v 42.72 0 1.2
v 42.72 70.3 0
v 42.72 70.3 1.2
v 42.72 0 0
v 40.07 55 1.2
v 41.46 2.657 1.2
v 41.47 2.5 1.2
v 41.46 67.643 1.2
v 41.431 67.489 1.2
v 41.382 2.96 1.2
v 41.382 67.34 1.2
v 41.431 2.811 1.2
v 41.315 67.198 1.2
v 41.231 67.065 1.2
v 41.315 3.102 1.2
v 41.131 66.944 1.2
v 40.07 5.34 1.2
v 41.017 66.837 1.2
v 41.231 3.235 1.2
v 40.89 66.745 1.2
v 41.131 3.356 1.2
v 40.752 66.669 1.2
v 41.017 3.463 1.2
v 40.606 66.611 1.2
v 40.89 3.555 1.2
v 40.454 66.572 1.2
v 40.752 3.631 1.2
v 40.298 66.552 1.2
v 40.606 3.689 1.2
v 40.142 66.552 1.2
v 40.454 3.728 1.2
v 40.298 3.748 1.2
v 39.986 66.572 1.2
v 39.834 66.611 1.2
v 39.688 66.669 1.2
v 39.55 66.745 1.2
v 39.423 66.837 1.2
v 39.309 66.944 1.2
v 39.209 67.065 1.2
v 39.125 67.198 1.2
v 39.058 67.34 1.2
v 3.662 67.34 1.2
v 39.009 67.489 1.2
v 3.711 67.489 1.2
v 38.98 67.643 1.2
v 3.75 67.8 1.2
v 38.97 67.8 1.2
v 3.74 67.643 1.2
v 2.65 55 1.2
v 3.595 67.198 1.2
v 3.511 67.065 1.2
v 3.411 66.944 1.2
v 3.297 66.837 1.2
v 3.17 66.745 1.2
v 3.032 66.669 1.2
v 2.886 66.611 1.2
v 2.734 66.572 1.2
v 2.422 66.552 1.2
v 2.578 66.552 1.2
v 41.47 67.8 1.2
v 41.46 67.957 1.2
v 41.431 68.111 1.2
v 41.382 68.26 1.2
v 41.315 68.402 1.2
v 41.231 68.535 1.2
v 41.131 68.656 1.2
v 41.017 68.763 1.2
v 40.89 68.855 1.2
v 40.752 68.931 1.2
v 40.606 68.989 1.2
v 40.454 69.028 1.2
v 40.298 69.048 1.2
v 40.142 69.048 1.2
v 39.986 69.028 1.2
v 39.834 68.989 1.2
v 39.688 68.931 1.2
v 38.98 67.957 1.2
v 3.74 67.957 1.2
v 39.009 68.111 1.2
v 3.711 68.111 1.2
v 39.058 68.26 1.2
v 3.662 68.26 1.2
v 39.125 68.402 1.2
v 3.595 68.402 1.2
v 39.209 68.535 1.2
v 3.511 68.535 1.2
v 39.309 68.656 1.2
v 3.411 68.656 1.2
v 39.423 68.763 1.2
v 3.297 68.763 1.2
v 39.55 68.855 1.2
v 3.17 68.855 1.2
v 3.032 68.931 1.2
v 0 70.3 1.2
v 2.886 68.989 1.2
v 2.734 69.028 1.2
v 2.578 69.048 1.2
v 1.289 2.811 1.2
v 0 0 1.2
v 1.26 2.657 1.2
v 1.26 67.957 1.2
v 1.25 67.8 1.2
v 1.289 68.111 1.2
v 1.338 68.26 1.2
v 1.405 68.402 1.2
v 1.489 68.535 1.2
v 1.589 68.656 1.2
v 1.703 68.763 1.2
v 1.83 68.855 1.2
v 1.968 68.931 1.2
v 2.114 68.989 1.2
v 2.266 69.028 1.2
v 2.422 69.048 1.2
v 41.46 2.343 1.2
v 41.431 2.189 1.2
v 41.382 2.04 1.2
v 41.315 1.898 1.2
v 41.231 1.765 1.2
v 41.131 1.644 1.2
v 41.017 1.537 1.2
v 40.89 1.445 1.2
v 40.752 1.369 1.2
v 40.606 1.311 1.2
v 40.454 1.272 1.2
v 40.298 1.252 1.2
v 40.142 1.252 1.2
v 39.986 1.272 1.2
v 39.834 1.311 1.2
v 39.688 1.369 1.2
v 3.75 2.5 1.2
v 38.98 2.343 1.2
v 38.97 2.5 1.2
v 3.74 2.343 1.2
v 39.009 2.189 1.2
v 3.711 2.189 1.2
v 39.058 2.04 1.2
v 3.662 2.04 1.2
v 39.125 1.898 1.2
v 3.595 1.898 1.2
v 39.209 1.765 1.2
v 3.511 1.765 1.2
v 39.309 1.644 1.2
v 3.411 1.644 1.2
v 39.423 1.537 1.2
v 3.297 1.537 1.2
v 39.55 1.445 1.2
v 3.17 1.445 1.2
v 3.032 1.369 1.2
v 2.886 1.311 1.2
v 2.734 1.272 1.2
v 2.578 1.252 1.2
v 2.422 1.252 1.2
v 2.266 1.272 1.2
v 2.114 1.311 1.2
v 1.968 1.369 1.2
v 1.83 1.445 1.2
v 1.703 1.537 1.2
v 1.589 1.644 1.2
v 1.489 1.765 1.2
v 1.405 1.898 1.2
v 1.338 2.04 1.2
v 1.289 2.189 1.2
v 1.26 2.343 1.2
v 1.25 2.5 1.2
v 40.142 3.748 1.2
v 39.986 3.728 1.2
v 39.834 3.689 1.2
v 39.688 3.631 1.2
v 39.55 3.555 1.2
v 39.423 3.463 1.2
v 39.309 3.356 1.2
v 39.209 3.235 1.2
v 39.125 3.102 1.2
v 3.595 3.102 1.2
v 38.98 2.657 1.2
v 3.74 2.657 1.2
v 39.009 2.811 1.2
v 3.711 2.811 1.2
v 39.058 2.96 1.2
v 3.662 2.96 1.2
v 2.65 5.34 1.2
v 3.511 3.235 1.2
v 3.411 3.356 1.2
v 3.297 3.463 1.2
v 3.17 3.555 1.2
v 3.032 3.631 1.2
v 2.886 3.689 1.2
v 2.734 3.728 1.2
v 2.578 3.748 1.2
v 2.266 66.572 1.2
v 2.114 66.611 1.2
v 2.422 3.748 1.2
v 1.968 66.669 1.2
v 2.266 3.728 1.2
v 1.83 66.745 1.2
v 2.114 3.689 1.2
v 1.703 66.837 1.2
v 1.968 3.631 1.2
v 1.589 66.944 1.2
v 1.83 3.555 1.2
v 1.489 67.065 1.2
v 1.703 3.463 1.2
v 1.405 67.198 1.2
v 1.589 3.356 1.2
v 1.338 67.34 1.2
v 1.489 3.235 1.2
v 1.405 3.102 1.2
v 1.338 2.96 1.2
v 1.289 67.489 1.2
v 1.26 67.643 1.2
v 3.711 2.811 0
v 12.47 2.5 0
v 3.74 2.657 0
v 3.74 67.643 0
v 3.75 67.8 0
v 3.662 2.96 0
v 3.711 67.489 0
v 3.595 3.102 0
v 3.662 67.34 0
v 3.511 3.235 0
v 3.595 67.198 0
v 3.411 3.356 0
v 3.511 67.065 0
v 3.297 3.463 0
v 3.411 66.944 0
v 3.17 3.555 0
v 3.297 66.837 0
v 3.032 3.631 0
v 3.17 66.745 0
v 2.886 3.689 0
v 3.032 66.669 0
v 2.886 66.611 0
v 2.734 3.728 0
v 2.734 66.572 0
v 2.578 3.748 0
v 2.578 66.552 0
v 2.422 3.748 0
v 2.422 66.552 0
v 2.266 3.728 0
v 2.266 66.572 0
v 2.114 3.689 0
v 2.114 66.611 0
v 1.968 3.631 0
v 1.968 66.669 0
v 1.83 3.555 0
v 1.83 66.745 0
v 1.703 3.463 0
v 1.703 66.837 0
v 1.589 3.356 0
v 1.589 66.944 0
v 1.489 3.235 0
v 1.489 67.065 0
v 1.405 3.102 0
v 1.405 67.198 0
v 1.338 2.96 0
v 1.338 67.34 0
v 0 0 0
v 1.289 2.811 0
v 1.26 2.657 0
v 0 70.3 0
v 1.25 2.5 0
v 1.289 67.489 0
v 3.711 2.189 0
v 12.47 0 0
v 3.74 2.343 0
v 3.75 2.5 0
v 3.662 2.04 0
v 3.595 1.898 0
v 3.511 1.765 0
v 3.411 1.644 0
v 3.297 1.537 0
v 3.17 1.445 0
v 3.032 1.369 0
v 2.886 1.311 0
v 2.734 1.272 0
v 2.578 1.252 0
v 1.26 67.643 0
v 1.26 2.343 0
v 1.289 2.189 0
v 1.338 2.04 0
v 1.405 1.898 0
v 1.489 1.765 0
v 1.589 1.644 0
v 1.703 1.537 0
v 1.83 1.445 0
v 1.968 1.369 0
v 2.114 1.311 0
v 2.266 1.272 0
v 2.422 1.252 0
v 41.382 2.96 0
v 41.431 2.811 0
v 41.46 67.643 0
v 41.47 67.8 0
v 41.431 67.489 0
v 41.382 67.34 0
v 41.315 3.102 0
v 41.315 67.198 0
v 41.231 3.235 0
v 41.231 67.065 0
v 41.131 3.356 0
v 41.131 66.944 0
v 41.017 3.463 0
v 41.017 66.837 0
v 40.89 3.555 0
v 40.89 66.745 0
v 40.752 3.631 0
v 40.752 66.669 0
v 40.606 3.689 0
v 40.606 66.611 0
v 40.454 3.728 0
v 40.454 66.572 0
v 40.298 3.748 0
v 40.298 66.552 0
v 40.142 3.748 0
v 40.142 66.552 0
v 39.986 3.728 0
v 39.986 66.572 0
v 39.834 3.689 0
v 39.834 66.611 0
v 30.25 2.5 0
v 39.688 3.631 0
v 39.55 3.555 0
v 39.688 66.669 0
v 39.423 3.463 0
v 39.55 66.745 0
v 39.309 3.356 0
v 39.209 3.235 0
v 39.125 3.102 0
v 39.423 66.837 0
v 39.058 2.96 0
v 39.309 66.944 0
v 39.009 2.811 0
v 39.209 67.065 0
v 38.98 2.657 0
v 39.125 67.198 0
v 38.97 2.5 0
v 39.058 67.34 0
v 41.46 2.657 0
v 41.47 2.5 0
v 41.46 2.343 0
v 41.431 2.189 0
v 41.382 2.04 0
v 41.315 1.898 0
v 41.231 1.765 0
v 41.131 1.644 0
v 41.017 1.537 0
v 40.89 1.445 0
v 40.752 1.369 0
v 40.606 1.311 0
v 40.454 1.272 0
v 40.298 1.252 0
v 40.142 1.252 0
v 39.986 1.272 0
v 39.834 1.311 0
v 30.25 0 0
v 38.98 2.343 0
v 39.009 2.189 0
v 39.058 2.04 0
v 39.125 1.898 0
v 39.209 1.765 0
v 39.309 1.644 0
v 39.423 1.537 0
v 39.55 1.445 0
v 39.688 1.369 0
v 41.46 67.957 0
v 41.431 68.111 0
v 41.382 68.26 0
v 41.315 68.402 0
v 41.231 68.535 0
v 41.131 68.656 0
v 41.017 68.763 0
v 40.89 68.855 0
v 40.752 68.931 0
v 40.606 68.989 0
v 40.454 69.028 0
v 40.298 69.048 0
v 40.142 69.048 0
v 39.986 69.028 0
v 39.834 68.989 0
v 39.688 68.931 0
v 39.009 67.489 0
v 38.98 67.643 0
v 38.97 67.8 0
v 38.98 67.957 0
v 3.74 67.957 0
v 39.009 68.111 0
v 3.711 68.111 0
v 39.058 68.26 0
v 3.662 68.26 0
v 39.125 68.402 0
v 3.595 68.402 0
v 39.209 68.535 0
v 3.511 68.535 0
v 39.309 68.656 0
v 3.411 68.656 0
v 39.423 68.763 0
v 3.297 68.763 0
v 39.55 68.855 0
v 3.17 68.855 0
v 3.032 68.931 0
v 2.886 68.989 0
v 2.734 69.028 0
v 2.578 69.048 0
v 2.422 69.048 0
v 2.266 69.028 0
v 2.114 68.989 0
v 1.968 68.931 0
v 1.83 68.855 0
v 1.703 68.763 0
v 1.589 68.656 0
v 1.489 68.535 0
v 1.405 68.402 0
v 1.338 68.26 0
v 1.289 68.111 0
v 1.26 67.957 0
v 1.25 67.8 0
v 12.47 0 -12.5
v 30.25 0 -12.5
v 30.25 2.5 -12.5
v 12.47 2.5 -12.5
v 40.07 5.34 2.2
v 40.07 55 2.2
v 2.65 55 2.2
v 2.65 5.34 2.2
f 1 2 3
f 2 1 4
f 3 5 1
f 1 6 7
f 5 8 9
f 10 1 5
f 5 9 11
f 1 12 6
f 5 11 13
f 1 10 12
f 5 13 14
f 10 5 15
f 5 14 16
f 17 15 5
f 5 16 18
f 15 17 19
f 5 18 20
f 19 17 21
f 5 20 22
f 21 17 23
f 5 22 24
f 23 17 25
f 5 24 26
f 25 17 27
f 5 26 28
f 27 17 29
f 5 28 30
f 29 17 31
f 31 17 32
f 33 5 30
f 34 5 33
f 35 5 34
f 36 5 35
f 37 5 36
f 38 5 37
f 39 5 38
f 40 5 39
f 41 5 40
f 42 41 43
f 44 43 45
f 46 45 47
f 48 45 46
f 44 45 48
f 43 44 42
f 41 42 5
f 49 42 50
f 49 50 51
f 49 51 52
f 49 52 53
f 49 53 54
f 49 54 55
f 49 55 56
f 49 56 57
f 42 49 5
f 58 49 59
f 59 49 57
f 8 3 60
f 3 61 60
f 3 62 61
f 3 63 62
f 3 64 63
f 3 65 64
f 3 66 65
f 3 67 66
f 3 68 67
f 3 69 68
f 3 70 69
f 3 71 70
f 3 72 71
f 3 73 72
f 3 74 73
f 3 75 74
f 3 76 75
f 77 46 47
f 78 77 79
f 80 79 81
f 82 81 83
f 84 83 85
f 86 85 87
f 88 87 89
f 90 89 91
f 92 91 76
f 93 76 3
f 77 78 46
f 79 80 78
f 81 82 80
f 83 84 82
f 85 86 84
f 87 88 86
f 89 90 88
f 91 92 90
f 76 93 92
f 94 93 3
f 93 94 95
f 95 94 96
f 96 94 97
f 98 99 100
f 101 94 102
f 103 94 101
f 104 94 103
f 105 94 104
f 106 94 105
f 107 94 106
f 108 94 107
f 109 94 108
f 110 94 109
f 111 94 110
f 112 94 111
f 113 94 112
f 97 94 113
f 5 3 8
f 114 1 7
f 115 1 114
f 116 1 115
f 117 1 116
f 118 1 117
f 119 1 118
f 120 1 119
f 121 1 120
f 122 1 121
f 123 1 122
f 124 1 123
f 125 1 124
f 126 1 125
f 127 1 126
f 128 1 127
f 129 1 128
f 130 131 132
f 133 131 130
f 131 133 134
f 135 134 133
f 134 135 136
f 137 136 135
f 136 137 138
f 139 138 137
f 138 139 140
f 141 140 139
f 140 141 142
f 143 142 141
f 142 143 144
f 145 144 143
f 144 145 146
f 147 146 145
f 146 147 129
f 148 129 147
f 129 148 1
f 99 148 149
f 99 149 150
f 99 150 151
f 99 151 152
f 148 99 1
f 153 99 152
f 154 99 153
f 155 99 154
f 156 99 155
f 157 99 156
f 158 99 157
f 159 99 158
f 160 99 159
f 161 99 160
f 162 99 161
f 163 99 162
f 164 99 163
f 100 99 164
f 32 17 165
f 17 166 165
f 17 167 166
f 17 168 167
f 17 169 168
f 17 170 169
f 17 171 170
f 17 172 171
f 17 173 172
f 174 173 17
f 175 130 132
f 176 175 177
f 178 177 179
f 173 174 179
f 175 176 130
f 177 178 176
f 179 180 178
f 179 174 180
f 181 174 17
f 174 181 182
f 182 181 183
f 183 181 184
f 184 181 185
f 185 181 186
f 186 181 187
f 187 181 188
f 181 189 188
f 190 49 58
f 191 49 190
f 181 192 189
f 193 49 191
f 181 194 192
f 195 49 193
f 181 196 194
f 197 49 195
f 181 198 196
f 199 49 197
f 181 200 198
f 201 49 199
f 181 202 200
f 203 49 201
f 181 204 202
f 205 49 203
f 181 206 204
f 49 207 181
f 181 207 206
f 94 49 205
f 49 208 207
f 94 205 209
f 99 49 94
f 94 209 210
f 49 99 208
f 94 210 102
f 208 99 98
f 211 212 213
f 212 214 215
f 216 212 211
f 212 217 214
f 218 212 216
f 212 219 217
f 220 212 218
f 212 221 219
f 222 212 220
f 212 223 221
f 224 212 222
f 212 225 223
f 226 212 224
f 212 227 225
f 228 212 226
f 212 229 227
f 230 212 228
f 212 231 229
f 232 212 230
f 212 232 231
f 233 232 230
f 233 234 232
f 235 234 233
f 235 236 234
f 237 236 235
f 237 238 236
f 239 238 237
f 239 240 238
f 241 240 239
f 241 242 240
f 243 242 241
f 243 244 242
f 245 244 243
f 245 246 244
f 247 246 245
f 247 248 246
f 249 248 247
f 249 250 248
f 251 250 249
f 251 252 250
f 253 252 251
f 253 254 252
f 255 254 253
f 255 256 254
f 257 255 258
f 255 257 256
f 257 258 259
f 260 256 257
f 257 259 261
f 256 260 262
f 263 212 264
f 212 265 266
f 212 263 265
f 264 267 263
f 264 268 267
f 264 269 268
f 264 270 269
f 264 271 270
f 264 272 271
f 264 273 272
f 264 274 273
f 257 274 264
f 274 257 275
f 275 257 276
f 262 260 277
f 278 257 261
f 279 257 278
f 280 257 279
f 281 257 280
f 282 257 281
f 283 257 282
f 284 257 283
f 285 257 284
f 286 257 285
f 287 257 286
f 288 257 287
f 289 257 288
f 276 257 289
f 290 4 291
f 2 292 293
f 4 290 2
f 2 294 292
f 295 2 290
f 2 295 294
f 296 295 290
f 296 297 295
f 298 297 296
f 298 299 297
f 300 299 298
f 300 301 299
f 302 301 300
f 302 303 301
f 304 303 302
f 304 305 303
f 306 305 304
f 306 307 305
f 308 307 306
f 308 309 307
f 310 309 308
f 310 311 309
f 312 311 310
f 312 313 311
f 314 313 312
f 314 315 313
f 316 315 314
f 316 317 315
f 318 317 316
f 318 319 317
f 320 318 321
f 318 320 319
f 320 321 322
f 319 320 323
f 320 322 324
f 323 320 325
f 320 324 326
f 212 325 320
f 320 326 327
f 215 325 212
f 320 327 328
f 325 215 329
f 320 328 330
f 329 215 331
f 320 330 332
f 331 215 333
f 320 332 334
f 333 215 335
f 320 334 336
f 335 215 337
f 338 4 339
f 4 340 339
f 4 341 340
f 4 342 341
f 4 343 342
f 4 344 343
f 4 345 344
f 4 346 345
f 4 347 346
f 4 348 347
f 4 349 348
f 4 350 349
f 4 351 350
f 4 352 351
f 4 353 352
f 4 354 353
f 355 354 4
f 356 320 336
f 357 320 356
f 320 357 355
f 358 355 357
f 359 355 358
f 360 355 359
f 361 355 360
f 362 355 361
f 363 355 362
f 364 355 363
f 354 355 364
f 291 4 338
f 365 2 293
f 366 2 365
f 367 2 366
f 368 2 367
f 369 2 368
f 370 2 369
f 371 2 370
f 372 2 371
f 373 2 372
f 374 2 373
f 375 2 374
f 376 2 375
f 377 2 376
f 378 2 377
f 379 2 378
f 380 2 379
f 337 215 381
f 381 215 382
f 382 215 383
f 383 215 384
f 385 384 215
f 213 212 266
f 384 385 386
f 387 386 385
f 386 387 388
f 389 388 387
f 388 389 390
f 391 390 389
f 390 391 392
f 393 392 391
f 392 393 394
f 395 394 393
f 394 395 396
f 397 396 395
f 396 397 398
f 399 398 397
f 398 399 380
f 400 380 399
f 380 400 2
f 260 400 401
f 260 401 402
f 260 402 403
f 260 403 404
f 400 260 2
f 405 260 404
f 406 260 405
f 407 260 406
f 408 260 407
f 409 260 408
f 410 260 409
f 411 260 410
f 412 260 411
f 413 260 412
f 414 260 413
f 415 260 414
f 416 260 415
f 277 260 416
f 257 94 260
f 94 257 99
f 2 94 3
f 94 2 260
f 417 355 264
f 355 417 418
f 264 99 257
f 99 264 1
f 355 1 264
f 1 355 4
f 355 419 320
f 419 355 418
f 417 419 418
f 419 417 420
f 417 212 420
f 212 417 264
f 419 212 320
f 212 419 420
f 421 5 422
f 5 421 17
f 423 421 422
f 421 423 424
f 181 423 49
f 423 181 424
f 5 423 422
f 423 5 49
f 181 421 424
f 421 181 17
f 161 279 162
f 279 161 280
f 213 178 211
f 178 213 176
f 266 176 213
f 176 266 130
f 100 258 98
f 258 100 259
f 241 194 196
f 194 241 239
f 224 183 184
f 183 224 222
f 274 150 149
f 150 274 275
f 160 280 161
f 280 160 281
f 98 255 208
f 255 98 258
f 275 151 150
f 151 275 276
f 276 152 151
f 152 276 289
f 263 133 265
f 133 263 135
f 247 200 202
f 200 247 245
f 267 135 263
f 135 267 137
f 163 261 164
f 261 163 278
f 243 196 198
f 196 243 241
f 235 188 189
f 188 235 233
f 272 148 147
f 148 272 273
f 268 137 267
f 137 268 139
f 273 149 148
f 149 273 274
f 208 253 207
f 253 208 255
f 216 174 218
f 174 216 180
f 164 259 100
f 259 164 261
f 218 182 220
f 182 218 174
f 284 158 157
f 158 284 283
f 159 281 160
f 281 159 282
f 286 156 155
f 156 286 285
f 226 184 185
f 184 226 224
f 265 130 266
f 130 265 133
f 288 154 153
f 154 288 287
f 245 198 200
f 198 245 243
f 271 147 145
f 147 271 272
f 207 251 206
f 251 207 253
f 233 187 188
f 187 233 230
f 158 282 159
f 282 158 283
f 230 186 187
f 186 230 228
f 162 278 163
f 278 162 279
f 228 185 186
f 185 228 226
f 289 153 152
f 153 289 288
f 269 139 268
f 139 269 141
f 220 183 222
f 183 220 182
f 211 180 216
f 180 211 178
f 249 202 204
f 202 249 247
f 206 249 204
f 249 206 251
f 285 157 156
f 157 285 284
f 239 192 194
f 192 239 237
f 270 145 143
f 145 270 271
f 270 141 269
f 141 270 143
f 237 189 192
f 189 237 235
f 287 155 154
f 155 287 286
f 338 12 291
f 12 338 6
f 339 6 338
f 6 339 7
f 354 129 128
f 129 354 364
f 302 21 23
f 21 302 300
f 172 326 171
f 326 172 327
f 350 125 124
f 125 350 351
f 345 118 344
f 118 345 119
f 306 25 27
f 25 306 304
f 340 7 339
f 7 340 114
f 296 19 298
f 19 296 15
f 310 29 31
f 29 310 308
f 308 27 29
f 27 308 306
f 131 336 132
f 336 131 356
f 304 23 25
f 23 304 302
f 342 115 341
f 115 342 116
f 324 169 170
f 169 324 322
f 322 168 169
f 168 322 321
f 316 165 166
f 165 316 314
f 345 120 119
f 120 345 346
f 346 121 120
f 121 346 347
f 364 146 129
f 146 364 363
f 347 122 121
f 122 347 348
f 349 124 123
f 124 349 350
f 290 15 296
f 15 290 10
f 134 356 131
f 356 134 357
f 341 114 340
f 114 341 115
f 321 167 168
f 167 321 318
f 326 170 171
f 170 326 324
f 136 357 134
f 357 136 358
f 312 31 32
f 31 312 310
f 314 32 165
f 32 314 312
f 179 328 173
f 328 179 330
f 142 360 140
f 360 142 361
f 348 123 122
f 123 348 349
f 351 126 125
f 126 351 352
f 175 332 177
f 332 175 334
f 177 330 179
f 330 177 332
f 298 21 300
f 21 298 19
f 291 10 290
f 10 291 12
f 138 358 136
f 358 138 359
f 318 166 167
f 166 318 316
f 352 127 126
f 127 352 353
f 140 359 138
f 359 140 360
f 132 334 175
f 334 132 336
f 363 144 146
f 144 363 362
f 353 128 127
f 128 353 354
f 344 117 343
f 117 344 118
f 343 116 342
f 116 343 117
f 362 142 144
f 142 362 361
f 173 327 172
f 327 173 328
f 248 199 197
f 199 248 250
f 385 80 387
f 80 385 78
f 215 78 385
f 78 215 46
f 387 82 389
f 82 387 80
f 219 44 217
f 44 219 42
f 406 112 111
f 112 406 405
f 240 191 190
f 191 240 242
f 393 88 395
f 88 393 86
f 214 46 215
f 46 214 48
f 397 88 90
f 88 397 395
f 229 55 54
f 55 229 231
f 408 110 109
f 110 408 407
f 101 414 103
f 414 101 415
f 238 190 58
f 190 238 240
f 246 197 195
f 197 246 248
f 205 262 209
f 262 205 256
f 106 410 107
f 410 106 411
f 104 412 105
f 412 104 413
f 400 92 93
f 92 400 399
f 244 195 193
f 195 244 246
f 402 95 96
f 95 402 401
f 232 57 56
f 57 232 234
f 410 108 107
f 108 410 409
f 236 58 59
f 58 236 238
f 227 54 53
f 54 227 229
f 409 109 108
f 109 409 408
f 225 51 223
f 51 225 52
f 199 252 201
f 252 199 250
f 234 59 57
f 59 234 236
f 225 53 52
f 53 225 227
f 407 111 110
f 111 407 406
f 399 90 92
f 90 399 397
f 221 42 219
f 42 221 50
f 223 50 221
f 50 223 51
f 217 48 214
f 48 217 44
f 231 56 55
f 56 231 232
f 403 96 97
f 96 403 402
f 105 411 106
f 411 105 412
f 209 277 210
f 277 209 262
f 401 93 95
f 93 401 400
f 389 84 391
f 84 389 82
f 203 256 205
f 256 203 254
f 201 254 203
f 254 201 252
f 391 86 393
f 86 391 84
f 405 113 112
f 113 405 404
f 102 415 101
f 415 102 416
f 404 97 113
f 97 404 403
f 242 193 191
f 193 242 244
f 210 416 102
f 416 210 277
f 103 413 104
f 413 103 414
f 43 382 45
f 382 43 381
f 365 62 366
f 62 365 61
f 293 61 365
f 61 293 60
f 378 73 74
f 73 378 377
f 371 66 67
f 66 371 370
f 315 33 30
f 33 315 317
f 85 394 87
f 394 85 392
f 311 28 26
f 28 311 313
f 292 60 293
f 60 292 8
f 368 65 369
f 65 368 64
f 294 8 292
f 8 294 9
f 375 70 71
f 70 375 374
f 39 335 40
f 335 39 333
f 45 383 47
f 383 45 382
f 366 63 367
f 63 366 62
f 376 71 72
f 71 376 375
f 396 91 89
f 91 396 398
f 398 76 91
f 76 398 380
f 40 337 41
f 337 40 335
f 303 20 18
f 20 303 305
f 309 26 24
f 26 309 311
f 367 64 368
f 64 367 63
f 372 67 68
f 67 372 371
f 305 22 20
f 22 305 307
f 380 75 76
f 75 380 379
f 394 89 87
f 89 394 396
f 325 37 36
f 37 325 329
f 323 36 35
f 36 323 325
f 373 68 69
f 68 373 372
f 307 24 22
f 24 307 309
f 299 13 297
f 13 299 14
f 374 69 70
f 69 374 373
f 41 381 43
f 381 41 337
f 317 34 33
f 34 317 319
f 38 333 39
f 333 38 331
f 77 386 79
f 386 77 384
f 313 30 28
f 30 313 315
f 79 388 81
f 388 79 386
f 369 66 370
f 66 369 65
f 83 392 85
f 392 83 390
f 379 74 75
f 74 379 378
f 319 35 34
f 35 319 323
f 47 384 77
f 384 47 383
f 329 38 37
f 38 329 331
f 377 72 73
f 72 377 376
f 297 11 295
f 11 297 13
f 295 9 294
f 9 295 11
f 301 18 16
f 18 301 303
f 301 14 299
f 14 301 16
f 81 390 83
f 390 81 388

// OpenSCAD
// Dimensions
pcb_width = 42.72;
pcb_height = 70.30;
pcb_thickness = 1.2;

pin_width = 17.78;
pin_height = 2.5;
pin_depth = 12.5;

screen_width = 37.42;
screen_height = 49.66;
screen_thickness = 1; // Assumed thickness
screen_offset_from_top = 15.3;

hole_diameter = 2.5;
hole_offset = 2.5;

// Main Assembly
module gmt130_display() {
    difference() {
        union() {
            // PCB
            pcb();

            // Pins on the back of the PCB
            pins();

            // Screen positioned from the top
            screen();
        }

        // Holes in the corners
        holes();
    }
}

// PCB Module
module pcb() {
    cube([pcb_width, pcb_height, pcb_thickness]);
}

// Pins Module
module pins() {
    pin_x_position = (pcb_width - pin_width) / 2;
    pin_y_position = 0; // Adjust if needed

    // Pins are on the back of the PCB (negative Z direction)
    translate([pin_x_position, pin_y_position, -pin_depth]) {
        cube([pin_width, pin_height, pin_depth]);
    }
}

// Screen Module
module screen() {
    x_position = (pcb_width - screen_width) / 2;
    y_position = pcb_height - screen_offset_from_top - screen_height;
    translate([x_position, y_position, pcb_thickness]) {
        cube([screen_width, screen_height, screen_thickness]);
    }
}

// Holes Module
module holes() {
    positions = [
        [hole_offset, hole_offset],
        [pcb_width - hole_offset, hole_offset],
        [hole_offset, pcb_height - hole_offset],
        [pcb_width - hole_offset, pcb_height - hole_offset]
    ];

    for (pos = positions) {
        translate([pos[0], pos[1], -1]) { // Extended into negative Z to ensure full cut-through
            cylinder(d = hole_diameter, h = pcb_thickness + 2 + pin_depth, $fn = 50);
        }
    }
}

// Render the GMT130 Display
gmt130_display();
